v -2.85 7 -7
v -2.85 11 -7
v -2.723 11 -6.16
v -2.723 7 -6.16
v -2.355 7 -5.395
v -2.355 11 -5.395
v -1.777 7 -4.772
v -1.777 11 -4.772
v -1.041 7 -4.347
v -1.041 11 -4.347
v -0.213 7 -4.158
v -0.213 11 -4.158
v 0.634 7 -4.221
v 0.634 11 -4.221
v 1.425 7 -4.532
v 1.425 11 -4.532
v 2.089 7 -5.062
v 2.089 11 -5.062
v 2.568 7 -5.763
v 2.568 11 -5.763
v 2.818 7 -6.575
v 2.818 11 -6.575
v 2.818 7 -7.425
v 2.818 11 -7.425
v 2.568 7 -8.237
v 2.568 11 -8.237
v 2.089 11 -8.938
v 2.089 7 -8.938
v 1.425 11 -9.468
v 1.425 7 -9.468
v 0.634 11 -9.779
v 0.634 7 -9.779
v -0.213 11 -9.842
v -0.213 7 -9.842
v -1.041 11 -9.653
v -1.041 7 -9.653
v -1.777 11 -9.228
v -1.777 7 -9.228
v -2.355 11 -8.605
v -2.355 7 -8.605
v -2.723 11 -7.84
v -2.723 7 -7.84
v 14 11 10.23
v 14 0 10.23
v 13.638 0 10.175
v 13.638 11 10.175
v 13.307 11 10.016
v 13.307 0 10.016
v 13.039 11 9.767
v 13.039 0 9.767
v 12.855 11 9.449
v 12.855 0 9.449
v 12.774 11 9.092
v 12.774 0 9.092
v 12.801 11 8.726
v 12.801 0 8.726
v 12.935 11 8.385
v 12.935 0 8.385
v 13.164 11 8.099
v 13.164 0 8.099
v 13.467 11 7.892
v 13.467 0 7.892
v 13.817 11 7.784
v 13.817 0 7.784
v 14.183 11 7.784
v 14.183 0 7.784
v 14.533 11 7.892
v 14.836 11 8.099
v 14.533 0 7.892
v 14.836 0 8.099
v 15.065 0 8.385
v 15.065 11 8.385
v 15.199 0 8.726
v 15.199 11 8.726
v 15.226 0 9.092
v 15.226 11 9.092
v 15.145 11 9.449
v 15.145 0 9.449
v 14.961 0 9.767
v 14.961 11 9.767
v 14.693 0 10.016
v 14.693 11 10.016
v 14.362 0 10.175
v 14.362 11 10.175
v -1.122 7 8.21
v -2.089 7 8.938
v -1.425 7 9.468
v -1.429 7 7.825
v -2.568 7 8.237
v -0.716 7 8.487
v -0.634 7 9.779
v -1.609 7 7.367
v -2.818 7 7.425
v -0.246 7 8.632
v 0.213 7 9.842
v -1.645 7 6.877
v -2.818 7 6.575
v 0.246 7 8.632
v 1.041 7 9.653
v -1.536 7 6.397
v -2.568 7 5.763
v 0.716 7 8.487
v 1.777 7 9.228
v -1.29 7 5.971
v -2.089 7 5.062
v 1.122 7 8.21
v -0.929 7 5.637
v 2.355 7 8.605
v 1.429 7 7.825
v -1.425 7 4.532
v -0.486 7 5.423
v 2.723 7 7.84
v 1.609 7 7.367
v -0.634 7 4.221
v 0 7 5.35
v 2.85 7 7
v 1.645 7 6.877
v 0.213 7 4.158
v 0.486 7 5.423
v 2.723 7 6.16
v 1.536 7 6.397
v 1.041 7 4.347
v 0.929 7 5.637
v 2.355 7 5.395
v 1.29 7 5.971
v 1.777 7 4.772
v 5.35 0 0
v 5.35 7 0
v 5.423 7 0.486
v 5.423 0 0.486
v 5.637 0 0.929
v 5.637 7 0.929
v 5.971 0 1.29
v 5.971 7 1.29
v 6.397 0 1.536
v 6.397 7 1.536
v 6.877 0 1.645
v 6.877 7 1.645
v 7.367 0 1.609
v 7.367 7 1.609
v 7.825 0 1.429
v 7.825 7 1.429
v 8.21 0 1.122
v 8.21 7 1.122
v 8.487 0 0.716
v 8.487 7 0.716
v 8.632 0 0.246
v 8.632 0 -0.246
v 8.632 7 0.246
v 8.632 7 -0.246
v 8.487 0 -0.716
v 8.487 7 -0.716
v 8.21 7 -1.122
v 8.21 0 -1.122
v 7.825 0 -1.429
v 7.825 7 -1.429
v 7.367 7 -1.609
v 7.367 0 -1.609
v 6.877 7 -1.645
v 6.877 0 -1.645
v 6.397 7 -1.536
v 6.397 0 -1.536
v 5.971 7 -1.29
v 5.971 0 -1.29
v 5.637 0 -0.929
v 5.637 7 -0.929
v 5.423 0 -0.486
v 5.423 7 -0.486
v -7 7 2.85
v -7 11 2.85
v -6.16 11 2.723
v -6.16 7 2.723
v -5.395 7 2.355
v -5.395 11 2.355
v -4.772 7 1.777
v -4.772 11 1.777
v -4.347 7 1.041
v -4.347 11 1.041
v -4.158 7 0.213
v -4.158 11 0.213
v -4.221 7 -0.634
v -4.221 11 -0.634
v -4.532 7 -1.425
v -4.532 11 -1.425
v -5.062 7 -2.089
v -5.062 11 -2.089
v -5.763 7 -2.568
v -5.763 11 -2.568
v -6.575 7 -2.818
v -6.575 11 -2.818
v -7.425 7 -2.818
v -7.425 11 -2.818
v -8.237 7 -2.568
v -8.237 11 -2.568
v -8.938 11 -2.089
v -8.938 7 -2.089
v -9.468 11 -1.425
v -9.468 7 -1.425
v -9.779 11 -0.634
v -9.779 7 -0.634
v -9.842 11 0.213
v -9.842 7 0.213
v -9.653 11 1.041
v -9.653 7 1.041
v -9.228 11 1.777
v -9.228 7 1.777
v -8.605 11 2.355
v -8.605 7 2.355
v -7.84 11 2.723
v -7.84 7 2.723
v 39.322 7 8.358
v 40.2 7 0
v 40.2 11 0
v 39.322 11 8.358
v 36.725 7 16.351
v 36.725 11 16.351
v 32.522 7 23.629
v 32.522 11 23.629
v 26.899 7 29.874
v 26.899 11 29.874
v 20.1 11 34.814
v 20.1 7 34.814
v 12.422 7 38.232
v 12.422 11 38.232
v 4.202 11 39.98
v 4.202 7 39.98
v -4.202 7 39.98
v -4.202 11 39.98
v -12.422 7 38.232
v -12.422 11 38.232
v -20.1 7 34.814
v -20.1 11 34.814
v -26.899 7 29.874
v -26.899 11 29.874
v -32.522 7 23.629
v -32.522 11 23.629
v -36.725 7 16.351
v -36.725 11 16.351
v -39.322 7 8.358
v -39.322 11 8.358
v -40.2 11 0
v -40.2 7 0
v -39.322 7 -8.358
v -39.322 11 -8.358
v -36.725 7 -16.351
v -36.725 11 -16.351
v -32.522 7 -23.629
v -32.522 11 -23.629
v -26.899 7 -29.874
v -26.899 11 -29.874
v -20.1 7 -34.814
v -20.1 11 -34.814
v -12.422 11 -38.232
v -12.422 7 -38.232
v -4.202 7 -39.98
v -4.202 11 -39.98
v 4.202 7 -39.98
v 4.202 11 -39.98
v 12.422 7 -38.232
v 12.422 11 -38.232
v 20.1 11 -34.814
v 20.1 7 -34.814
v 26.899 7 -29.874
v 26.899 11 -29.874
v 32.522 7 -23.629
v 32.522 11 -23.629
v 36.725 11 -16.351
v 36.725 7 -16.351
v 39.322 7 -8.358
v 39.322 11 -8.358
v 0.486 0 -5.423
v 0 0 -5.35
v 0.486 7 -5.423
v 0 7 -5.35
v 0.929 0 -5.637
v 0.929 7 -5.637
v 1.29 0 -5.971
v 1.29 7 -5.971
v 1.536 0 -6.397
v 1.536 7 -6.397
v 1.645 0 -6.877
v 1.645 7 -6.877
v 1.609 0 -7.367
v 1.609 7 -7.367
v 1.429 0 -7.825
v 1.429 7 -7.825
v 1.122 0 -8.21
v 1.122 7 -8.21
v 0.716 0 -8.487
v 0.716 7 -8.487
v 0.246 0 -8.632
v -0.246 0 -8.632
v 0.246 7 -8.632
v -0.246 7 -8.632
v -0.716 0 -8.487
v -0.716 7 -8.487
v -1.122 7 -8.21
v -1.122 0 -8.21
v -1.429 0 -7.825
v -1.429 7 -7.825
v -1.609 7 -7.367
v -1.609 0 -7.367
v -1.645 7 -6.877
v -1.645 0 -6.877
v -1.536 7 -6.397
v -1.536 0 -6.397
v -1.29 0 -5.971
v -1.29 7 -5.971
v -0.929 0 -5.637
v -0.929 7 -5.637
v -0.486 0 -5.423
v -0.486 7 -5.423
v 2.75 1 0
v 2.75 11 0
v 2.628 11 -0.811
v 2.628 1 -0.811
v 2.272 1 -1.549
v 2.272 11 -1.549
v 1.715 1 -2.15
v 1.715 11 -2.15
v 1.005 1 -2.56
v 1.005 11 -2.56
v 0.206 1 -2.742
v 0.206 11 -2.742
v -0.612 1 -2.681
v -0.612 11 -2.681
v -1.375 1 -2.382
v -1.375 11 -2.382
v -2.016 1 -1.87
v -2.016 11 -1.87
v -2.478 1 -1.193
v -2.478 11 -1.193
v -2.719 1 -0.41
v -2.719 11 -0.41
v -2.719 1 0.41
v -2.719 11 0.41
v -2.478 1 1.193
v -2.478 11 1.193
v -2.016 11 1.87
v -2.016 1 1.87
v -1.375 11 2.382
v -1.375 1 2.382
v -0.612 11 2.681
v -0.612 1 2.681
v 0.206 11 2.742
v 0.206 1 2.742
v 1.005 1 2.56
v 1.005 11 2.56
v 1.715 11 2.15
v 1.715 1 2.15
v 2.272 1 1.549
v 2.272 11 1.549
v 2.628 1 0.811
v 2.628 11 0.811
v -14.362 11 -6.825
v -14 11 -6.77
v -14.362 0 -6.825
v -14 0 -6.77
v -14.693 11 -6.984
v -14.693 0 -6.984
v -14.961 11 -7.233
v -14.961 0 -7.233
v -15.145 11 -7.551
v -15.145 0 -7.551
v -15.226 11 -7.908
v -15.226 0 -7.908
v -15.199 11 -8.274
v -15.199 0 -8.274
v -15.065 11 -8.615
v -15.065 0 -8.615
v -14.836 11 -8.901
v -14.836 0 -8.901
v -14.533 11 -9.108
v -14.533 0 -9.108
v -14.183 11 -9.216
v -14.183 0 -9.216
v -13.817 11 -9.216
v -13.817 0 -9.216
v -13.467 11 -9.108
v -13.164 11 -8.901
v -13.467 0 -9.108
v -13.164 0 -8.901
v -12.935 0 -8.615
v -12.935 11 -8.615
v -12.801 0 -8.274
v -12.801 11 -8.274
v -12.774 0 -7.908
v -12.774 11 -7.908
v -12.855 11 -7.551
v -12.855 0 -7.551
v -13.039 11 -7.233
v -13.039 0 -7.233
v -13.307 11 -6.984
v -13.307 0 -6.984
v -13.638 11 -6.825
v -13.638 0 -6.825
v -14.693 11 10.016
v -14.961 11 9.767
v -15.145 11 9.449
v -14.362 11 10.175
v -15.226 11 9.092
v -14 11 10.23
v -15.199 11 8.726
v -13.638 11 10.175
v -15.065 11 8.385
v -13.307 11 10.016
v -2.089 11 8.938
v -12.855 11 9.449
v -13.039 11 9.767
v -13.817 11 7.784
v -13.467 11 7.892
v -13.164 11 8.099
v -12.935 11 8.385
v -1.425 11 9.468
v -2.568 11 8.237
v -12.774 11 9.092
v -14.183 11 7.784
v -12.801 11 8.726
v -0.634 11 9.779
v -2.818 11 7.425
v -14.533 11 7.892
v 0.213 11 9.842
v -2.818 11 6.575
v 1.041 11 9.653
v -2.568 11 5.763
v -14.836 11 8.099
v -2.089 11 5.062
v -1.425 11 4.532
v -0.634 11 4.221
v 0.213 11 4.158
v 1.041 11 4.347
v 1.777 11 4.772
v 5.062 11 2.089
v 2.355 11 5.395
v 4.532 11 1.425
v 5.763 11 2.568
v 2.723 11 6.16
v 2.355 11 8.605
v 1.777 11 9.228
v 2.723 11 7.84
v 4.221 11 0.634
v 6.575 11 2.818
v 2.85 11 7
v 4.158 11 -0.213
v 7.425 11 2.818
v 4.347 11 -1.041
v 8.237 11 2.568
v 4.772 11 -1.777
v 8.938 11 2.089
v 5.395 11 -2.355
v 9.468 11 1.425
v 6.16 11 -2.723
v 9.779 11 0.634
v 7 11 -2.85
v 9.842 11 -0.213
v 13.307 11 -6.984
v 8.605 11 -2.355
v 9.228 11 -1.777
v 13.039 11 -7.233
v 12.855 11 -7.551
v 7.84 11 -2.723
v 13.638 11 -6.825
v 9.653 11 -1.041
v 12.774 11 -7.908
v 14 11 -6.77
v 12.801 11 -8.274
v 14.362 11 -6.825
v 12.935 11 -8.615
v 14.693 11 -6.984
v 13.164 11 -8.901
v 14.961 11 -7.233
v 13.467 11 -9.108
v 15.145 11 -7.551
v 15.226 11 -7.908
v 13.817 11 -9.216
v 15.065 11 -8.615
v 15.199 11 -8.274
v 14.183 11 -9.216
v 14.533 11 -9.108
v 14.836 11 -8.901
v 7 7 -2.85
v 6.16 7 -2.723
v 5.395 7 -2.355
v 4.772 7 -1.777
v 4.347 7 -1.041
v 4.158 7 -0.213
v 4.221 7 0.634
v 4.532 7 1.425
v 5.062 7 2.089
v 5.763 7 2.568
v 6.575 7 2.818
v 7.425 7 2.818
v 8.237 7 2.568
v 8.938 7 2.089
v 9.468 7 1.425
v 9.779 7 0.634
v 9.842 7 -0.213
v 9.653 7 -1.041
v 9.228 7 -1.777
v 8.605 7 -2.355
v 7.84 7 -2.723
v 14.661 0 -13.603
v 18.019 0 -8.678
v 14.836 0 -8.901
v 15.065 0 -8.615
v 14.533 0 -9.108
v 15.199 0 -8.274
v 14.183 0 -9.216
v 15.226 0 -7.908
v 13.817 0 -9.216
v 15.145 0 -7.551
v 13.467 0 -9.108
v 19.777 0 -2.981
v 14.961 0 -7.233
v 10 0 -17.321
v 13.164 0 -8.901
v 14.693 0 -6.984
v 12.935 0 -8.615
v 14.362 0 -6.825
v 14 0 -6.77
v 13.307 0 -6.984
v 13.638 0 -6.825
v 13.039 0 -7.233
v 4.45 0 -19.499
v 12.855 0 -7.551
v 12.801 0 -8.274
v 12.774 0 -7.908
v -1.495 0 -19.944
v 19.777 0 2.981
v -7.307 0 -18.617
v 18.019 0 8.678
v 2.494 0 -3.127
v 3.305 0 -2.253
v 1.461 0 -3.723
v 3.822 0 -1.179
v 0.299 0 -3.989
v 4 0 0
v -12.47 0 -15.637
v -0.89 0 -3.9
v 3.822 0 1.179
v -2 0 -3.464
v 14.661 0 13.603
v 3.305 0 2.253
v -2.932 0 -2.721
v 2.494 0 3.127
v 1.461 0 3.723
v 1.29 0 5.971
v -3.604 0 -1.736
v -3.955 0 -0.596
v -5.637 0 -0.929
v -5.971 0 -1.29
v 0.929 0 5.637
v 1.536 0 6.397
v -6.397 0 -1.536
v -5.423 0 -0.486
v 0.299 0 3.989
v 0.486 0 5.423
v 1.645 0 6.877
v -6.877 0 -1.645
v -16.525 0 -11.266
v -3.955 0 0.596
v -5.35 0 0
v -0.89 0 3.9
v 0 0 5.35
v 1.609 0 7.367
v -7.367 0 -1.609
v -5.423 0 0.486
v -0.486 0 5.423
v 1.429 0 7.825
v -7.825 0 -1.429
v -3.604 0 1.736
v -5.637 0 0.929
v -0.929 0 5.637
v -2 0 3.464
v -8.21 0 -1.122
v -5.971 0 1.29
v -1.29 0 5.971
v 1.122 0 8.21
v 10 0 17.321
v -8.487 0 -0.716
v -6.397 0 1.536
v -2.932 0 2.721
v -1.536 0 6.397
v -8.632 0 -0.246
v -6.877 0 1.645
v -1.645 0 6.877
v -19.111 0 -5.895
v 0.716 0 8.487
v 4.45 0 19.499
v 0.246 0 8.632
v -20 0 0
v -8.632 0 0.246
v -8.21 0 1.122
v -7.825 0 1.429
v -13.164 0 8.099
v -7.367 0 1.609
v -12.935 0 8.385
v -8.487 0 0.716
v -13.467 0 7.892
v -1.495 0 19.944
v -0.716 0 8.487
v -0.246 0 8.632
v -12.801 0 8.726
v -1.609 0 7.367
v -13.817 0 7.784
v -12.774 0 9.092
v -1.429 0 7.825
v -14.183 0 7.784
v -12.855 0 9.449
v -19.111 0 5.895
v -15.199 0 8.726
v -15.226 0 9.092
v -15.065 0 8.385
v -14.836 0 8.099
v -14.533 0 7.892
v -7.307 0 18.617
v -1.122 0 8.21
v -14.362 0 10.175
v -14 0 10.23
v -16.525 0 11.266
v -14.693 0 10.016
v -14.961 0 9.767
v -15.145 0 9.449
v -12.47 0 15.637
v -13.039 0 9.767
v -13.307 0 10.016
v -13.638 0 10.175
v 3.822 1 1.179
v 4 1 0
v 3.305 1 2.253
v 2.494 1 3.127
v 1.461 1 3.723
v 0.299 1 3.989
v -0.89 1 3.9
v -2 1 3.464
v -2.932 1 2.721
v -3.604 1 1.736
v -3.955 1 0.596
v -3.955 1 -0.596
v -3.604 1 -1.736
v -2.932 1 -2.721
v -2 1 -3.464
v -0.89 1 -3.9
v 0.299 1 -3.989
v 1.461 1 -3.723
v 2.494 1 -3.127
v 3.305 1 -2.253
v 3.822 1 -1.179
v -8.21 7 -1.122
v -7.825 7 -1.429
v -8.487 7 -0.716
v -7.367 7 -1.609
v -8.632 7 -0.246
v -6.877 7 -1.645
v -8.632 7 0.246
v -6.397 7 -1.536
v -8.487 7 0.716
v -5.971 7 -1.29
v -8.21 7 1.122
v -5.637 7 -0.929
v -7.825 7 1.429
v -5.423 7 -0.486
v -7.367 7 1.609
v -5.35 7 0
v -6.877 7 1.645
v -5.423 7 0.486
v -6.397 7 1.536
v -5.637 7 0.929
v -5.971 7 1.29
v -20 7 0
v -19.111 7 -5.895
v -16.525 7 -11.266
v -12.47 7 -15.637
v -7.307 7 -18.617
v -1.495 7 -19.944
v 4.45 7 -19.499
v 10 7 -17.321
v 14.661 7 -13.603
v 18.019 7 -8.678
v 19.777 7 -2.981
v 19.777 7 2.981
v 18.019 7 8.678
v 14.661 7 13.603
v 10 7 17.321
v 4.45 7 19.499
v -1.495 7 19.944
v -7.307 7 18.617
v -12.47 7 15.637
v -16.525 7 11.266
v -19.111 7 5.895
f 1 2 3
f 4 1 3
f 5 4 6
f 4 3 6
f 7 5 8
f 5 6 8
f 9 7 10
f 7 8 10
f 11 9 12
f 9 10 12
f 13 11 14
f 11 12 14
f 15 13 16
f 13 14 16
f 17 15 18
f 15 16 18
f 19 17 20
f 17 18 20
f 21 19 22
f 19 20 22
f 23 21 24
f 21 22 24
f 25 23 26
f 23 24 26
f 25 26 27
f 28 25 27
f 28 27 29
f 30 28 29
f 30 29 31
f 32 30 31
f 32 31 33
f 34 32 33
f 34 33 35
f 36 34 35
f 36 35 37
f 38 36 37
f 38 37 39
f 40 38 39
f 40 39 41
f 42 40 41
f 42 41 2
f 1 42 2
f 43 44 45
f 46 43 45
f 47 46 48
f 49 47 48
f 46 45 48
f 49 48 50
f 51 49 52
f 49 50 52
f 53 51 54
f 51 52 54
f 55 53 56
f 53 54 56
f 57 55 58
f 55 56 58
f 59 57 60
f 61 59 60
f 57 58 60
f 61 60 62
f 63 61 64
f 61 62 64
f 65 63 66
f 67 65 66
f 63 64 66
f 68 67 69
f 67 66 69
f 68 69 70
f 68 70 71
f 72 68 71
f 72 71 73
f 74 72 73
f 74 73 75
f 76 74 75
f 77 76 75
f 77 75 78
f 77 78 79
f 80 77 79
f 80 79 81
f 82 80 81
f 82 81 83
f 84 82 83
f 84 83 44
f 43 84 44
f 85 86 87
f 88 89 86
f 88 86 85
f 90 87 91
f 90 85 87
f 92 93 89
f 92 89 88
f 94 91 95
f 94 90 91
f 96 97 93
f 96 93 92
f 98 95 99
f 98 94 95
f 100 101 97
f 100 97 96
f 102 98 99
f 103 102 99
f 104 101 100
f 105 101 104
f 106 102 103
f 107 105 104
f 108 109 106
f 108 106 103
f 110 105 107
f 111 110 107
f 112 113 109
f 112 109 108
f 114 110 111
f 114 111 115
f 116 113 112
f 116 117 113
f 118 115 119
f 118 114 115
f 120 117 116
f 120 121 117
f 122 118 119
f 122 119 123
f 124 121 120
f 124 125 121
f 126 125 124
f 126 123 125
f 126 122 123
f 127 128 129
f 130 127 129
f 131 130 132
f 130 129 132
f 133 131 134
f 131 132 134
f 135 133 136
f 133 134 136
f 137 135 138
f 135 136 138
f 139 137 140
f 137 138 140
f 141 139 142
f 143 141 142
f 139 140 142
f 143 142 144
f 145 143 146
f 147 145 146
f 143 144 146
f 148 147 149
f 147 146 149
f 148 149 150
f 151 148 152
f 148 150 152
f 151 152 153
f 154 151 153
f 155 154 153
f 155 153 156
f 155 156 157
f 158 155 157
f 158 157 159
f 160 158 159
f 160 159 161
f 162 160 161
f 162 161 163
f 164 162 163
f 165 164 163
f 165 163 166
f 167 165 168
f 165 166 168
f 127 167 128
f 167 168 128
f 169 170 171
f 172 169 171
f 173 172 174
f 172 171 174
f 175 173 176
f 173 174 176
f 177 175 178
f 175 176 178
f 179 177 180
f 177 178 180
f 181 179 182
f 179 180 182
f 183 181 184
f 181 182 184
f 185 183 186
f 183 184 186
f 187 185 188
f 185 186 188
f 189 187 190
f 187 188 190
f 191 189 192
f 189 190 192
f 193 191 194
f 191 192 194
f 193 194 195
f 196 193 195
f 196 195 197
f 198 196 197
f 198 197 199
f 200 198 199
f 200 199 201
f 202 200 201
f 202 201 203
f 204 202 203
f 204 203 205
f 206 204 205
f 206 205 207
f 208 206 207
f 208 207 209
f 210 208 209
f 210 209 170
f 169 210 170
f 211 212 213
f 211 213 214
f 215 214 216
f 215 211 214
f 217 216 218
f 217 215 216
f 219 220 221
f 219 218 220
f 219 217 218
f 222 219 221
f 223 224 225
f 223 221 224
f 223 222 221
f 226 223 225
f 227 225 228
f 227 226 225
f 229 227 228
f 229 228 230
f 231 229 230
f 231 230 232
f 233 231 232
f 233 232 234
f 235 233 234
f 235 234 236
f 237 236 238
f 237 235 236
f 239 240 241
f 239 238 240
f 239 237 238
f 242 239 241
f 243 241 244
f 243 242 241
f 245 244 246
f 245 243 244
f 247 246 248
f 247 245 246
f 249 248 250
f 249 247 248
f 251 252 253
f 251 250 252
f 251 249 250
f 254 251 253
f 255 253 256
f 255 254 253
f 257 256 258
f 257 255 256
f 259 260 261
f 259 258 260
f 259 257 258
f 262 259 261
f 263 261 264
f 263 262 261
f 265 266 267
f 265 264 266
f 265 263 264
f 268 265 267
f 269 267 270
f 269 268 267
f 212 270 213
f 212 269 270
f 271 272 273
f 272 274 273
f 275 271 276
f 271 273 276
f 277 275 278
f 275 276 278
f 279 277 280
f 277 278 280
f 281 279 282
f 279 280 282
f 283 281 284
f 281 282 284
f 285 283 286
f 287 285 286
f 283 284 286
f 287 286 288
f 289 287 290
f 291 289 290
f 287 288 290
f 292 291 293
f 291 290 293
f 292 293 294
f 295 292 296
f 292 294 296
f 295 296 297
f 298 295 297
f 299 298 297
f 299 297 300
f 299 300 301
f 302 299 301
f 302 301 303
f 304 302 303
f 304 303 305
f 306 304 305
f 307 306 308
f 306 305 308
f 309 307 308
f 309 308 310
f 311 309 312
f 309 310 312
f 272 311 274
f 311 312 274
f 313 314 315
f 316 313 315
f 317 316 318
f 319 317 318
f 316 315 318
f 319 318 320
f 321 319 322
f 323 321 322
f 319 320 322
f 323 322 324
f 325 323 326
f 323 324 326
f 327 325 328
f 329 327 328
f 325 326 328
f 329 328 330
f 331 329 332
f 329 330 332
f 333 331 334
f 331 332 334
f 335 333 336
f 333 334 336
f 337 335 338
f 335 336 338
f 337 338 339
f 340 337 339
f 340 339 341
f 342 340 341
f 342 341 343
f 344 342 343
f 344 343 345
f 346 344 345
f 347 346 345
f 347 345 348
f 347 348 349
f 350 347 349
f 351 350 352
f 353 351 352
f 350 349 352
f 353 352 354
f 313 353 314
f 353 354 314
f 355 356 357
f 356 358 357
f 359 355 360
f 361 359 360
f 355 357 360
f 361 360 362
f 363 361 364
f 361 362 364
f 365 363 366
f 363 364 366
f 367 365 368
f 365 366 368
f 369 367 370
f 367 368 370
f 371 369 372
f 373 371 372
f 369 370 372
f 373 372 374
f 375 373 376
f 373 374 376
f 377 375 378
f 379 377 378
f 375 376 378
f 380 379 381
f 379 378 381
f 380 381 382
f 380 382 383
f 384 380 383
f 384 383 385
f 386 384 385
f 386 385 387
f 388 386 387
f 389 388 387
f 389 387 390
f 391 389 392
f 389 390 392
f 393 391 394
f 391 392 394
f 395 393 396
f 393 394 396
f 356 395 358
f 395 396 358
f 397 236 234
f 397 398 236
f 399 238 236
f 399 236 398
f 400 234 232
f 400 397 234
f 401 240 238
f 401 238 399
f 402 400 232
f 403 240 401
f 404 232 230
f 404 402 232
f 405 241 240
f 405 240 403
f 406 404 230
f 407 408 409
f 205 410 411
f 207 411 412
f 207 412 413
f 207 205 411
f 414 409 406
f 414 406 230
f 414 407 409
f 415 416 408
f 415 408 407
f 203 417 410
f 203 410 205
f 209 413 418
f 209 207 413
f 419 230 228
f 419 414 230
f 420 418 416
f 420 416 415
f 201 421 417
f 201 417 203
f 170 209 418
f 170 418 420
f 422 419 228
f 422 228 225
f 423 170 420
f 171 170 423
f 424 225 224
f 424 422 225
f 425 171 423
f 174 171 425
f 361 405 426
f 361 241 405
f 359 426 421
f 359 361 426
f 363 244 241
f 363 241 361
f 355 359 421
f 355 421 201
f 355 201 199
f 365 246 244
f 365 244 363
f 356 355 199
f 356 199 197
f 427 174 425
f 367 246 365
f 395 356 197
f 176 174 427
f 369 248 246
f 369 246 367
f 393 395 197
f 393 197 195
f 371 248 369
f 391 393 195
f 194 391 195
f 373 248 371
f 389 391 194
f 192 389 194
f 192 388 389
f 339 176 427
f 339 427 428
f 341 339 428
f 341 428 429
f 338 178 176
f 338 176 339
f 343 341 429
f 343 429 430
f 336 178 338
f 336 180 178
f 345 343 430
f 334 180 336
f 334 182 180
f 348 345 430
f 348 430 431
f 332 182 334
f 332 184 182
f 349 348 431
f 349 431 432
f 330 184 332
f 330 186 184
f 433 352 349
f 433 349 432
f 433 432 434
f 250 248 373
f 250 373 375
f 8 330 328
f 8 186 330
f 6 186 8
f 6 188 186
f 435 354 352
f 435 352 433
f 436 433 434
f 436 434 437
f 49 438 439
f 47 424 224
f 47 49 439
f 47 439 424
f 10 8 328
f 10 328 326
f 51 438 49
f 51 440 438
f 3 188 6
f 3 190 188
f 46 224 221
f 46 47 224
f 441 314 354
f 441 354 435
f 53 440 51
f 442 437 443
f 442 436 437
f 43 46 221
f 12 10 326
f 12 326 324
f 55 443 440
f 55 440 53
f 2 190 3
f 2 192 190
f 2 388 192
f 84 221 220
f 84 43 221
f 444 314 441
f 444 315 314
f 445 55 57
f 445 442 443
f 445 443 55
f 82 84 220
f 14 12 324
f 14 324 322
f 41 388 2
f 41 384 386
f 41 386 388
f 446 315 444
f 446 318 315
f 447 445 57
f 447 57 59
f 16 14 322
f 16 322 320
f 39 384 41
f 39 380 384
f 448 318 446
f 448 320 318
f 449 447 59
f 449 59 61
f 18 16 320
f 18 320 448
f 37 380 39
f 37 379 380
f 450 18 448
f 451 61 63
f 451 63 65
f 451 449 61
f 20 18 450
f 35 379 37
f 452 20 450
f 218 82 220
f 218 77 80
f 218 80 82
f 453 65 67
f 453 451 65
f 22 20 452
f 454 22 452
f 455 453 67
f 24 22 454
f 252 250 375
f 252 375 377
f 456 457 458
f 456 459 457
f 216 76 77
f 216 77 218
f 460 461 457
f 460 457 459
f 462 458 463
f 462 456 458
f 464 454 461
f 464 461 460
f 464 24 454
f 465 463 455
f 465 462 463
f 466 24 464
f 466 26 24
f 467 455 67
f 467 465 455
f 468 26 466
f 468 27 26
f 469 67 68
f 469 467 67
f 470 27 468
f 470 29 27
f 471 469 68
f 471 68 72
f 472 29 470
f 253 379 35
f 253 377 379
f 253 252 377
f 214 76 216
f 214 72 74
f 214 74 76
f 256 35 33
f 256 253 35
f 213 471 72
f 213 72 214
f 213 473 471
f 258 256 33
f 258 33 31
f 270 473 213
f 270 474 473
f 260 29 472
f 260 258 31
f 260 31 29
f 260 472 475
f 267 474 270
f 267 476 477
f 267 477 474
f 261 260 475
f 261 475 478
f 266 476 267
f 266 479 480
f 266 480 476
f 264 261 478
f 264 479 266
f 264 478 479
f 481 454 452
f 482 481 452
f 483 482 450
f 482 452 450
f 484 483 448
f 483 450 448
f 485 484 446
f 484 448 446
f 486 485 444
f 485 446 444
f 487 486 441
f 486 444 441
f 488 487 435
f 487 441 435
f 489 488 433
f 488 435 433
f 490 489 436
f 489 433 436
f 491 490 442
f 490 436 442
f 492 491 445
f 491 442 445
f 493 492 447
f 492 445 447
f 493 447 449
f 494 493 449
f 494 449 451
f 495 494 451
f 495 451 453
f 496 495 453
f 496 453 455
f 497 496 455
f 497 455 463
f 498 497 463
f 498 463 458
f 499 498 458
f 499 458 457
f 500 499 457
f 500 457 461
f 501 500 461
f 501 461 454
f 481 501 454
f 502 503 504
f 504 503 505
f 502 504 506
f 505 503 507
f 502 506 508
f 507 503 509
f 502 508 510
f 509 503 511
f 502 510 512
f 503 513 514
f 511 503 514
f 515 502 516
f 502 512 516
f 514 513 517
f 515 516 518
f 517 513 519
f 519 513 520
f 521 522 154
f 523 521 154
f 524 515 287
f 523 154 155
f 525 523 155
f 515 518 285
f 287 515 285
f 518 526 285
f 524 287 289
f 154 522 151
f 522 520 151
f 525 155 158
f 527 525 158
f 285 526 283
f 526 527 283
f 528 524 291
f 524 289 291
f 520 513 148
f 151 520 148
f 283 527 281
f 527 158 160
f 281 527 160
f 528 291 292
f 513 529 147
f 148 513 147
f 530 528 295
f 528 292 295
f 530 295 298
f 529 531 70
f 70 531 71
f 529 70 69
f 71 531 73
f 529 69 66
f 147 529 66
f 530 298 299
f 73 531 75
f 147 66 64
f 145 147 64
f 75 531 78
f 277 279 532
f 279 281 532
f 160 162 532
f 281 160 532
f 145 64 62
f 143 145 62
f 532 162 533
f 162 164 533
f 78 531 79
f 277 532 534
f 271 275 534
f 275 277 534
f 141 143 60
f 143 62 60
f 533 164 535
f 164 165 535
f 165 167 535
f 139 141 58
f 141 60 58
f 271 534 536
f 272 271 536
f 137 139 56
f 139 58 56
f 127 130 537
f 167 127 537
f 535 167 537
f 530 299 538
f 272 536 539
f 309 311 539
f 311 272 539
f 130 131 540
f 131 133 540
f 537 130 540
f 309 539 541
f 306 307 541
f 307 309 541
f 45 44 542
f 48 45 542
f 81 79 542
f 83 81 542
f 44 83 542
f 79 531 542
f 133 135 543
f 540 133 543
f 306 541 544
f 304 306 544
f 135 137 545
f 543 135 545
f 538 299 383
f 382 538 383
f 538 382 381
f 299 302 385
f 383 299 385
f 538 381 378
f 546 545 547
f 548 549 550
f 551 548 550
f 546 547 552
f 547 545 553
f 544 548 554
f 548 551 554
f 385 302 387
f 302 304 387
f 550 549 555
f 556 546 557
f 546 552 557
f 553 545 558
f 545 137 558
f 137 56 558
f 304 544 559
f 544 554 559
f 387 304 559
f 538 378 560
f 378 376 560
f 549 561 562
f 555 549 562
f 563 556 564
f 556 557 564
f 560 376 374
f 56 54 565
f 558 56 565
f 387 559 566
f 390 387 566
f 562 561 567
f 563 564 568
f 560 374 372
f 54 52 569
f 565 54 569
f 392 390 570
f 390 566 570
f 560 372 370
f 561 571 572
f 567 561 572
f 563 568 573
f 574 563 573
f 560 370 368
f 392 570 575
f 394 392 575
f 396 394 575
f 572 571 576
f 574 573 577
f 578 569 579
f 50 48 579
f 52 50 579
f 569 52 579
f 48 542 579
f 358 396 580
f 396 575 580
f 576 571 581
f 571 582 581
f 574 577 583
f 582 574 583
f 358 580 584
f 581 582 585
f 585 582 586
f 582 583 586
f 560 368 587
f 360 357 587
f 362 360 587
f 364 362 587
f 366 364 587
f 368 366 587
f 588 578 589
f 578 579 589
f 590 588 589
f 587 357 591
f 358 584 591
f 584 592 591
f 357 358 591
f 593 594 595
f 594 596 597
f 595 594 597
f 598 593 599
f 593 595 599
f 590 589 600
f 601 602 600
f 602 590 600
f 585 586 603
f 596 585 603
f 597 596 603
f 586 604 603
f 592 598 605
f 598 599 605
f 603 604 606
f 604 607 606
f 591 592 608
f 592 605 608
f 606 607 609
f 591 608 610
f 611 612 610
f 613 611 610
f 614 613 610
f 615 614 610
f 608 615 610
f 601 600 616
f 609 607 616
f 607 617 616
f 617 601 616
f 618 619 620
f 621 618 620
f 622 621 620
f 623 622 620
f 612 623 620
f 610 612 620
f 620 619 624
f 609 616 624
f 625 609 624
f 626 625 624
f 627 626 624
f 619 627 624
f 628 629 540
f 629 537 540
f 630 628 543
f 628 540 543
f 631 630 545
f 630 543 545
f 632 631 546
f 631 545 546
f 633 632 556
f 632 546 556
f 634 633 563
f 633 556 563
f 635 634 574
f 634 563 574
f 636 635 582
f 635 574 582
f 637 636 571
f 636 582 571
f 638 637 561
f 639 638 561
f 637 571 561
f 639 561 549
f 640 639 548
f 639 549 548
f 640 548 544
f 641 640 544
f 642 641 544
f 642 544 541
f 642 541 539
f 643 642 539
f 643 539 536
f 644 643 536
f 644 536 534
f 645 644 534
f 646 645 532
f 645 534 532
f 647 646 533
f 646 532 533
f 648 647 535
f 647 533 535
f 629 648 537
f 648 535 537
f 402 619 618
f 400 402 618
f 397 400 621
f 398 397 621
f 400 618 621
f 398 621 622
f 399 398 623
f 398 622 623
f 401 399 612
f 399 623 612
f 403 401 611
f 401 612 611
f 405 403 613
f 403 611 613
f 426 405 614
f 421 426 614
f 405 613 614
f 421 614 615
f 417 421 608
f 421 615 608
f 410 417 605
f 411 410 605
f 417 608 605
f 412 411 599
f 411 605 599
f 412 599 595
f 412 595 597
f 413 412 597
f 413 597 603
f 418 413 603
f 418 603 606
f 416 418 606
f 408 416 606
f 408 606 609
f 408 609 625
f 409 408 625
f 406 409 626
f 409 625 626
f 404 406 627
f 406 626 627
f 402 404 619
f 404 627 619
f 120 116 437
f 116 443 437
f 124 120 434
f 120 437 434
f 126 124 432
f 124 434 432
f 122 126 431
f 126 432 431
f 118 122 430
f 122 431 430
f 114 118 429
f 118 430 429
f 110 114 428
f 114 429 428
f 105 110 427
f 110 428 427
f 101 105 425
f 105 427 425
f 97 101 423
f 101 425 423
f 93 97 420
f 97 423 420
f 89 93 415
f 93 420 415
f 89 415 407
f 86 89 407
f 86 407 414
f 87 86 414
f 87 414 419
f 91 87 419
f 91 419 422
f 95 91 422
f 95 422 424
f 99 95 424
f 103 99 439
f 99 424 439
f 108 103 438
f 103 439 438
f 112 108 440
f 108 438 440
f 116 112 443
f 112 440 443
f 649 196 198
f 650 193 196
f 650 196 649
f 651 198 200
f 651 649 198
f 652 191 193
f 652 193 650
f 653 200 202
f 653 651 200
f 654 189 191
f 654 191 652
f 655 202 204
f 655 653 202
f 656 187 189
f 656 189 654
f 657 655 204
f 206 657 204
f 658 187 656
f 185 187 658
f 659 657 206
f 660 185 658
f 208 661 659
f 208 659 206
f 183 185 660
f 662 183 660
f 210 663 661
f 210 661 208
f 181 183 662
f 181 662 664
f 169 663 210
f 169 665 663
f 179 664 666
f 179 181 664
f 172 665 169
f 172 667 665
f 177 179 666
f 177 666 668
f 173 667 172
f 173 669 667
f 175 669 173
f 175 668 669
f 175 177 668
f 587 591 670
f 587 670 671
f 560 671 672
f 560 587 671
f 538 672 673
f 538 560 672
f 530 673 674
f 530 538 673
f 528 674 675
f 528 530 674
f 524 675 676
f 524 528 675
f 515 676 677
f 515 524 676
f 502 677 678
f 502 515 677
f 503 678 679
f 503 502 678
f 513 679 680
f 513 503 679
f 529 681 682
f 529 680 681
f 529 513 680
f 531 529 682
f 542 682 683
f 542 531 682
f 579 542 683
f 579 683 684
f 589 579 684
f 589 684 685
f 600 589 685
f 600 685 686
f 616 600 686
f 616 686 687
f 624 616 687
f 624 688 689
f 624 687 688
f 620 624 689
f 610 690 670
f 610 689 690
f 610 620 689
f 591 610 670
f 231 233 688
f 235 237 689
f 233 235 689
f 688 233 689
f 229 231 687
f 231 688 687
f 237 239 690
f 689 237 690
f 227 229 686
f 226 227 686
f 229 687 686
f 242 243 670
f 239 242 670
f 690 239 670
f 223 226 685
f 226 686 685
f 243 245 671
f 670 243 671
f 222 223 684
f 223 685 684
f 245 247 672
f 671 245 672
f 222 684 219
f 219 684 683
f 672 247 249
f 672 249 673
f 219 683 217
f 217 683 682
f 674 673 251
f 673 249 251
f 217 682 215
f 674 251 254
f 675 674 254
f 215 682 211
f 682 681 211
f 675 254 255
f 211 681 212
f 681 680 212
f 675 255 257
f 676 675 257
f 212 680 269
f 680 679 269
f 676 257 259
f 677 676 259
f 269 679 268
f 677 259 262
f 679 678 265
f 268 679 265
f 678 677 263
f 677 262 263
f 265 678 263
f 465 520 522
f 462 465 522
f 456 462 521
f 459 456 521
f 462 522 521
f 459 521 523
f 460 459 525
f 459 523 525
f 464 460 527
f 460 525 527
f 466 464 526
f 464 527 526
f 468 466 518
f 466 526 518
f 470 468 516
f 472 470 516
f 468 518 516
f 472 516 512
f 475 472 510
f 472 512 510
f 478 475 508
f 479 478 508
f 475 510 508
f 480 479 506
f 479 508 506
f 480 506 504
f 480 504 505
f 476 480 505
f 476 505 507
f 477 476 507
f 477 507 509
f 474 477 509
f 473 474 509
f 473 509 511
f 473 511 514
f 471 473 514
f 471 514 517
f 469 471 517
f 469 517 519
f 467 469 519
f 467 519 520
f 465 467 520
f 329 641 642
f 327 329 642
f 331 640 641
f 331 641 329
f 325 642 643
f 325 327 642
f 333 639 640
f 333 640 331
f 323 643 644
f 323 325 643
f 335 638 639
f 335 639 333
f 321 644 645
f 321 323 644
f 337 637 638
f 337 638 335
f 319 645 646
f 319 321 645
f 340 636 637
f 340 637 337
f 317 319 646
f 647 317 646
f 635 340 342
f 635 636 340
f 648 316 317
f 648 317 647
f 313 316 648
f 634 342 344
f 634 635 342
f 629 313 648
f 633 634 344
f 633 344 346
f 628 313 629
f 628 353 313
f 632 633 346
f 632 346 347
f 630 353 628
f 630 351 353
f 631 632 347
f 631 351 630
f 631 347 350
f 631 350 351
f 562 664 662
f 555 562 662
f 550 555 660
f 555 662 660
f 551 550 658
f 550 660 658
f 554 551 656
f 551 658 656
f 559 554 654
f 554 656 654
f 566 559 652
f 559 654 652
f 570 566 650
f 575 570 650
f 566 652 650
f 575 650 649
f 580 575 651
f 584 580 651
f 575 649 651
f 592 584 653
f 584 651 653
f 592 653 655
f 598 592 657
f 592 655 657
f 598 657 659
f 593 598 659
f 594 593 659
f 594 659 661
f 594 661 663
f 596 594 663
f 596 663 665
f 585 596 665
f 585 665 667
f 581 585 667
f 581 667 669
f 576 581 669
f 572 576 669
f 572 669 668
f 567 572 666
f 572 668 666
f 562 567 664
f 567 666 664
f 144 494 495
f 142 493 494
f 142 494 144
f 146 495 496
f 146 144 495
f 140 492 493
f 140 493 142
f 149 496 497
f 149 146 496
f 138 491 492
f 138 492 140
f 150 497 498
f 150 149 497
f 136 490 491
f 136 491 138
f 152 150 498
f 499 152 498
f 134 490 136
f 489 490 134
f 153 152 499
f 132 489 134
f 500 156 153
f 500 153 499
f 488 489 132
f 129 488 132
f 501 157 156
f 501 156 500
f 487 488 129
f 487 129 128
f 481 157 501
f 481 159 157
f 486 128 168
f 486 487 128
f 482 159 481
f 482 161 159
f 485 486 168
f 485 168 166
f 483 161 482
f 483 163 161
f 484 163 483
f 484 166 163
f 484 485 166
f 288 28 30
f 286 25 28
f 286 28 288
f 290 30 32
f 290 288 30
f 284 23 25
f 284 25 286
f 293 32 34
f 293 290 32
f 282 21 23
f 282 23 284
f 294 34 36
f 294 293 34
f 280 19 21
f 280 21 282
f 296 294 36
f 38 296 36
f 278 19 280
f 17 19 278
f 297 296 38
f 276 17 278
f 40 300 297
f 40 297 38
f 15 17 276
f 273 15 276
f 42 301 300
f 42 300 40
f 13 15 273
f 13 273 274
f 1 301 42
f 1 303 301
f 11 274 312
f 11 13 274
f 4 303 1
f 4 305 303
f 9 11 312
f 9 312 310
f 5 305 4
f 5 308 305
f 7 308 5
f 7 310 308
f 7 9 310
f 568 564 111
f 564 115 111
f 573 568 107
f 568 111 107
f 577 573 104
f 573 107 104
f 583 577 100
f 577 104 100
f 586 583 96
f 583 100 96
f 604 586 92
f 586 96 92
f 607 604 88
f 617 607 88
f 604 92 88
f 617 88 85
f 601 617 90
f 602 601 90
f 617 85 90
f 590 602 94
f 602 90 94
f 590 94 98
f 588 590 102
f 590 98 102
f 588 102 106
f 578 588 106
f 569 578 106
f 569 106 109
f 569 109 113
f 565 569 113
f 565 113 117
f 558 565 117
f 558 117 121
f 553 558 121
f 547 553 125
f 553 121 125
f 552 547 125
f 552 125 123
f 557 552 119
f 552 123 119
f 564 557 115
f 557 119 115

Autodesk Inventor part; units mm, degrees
ref_plane "YZ Plane" through (0, 0, 0) normal (1, 0, 0) x (0, 1, 0)
ref_plane "XZ Plane" through (0, 0, 0) normal (0, 1, 0) x (-1, 0, 0)
ref_plane "XY Plane" through (0, 0, 0) normal (0, 0, 1) x (1, 0, 0)
sketch "Sketch1" plane through (0, 0, 0) normal (0, 1, 0) x (-1, 0, 0)
  circle A0 centre (0, 0) radius 20
  dimension "d0" = 40
extrude "Extrusion1" add sketch "Sketch1" along normal blind 7
sketch "Sketch2" plane through (0, 7, 0) normal (0, 1, 0) x (1, 0, 0)
  circle A0 centre (0, 0) radius 40.2
  dimension "d3" = 80.4
extrude "Extrusion2" add sketch "Sketch2" along normal blind 4
sketch "Sketch3" plane through (0, 0, 0) normal (0, -1, 0) x (1, 0, 0)
  point P0 (0, 0)
  point P1 (0, 7)
  dimension "d6" = 7
hole "Hole1" at (0, 0, 7) direction (0, 1, 0) diameter 3.3 end through all clearance for "Flat Head Machine Screw" size "M3" standard "Ansi Metric M Profile"
pattern_circular "Circular Pattern1" count 4 over 360 about axis through (0, -10, 0) along (0, 1, 0) of "Hole1"
sketch "Sketch4" plane through (0, 11, 0) normal (0, 1, 0) x (1, 0, 0)
  circle A0 centre (0, 0) radius 2.75
  dimension "d17" = 5.5
extrude "Extrusion3" cut sketch "Sketch4" against normal up to surface (11 mm away)
sketch "Sketch5" plane through (0, 0, 0) normal (0, -1, 0) x (1, 0, 0)
  circle A0 centre (0, 0) radius 4
  dimension "d20" = 8
extrude "Extrusion4" cut sketch "Sketch5" against normal blind 1
sketch "Sketch6" plane through (0, 11, 0) normal (0, 1, 0) x (1, 0, 0)
  circle A0 centre (0, 0) radius 2.75 projected
  circle A1 centre (-7, 0) radius 1.65 projected
  circle A2 centre (0, 7) radius 1.65 projected
  circle A3 centre (7, 0) radius 1.65 projected
  circle A4 centre (0, -7) radius 1.65 projected
  circle A5 centre (0, 0) radius 40.2 projected
  circle A6 centre (0, -7) radius 2.85
  dimension "d23" = 5.7
extrude "Extrusion5" cut sketch "Sketch6" against normal blind 4 contours A6
pattern_circular "Circular Pattern2" count 4 over 360 about axis through (0, 11, 0) along (0, -1, 0) of "Extrusion5"
sketch "Sketch8" plane through (0, 11, 0) normal (0, 1, 0) x (1, 0, 0)
  line L0 (-14, -9) -> (14, -9)
  line L1 (14, -9) -> (14, 8)
  line L2 (14, 8) -> (-14, 8)
  line L3 (-14, 8) -> (-14, -9)
  circle A0 centre (7, 0) radius 2.85 projected
  circle A1 centre (0, 7) radius 2.85 projected
  circle A2 centre (-7, 0) radius 2.85 projected
  circle A3 centre (0, -7) radius 2.85 projected
  circle A4 centre (0, 0) radius 2.75 projected
  circle A5 centre (0, 0) radius 40.2 projected
  dimension "d29" = 17
  dimension "d30" = 28
  dimension "d31" = 7
  dimension "d32" = 7
  dimension "d33" = 2
hole "Hole2" at (-14, 11, 9) at (14, 11, 9) at (14, 11, -8) at (-14, 11, -8) direction (0, -1, 0) diameter 2.459 end through all thread size "M3x0.5" class "6H" standard "ANSI Metric M Profile"
equation "\"d31\" = d32"
properties part number "table_2"
